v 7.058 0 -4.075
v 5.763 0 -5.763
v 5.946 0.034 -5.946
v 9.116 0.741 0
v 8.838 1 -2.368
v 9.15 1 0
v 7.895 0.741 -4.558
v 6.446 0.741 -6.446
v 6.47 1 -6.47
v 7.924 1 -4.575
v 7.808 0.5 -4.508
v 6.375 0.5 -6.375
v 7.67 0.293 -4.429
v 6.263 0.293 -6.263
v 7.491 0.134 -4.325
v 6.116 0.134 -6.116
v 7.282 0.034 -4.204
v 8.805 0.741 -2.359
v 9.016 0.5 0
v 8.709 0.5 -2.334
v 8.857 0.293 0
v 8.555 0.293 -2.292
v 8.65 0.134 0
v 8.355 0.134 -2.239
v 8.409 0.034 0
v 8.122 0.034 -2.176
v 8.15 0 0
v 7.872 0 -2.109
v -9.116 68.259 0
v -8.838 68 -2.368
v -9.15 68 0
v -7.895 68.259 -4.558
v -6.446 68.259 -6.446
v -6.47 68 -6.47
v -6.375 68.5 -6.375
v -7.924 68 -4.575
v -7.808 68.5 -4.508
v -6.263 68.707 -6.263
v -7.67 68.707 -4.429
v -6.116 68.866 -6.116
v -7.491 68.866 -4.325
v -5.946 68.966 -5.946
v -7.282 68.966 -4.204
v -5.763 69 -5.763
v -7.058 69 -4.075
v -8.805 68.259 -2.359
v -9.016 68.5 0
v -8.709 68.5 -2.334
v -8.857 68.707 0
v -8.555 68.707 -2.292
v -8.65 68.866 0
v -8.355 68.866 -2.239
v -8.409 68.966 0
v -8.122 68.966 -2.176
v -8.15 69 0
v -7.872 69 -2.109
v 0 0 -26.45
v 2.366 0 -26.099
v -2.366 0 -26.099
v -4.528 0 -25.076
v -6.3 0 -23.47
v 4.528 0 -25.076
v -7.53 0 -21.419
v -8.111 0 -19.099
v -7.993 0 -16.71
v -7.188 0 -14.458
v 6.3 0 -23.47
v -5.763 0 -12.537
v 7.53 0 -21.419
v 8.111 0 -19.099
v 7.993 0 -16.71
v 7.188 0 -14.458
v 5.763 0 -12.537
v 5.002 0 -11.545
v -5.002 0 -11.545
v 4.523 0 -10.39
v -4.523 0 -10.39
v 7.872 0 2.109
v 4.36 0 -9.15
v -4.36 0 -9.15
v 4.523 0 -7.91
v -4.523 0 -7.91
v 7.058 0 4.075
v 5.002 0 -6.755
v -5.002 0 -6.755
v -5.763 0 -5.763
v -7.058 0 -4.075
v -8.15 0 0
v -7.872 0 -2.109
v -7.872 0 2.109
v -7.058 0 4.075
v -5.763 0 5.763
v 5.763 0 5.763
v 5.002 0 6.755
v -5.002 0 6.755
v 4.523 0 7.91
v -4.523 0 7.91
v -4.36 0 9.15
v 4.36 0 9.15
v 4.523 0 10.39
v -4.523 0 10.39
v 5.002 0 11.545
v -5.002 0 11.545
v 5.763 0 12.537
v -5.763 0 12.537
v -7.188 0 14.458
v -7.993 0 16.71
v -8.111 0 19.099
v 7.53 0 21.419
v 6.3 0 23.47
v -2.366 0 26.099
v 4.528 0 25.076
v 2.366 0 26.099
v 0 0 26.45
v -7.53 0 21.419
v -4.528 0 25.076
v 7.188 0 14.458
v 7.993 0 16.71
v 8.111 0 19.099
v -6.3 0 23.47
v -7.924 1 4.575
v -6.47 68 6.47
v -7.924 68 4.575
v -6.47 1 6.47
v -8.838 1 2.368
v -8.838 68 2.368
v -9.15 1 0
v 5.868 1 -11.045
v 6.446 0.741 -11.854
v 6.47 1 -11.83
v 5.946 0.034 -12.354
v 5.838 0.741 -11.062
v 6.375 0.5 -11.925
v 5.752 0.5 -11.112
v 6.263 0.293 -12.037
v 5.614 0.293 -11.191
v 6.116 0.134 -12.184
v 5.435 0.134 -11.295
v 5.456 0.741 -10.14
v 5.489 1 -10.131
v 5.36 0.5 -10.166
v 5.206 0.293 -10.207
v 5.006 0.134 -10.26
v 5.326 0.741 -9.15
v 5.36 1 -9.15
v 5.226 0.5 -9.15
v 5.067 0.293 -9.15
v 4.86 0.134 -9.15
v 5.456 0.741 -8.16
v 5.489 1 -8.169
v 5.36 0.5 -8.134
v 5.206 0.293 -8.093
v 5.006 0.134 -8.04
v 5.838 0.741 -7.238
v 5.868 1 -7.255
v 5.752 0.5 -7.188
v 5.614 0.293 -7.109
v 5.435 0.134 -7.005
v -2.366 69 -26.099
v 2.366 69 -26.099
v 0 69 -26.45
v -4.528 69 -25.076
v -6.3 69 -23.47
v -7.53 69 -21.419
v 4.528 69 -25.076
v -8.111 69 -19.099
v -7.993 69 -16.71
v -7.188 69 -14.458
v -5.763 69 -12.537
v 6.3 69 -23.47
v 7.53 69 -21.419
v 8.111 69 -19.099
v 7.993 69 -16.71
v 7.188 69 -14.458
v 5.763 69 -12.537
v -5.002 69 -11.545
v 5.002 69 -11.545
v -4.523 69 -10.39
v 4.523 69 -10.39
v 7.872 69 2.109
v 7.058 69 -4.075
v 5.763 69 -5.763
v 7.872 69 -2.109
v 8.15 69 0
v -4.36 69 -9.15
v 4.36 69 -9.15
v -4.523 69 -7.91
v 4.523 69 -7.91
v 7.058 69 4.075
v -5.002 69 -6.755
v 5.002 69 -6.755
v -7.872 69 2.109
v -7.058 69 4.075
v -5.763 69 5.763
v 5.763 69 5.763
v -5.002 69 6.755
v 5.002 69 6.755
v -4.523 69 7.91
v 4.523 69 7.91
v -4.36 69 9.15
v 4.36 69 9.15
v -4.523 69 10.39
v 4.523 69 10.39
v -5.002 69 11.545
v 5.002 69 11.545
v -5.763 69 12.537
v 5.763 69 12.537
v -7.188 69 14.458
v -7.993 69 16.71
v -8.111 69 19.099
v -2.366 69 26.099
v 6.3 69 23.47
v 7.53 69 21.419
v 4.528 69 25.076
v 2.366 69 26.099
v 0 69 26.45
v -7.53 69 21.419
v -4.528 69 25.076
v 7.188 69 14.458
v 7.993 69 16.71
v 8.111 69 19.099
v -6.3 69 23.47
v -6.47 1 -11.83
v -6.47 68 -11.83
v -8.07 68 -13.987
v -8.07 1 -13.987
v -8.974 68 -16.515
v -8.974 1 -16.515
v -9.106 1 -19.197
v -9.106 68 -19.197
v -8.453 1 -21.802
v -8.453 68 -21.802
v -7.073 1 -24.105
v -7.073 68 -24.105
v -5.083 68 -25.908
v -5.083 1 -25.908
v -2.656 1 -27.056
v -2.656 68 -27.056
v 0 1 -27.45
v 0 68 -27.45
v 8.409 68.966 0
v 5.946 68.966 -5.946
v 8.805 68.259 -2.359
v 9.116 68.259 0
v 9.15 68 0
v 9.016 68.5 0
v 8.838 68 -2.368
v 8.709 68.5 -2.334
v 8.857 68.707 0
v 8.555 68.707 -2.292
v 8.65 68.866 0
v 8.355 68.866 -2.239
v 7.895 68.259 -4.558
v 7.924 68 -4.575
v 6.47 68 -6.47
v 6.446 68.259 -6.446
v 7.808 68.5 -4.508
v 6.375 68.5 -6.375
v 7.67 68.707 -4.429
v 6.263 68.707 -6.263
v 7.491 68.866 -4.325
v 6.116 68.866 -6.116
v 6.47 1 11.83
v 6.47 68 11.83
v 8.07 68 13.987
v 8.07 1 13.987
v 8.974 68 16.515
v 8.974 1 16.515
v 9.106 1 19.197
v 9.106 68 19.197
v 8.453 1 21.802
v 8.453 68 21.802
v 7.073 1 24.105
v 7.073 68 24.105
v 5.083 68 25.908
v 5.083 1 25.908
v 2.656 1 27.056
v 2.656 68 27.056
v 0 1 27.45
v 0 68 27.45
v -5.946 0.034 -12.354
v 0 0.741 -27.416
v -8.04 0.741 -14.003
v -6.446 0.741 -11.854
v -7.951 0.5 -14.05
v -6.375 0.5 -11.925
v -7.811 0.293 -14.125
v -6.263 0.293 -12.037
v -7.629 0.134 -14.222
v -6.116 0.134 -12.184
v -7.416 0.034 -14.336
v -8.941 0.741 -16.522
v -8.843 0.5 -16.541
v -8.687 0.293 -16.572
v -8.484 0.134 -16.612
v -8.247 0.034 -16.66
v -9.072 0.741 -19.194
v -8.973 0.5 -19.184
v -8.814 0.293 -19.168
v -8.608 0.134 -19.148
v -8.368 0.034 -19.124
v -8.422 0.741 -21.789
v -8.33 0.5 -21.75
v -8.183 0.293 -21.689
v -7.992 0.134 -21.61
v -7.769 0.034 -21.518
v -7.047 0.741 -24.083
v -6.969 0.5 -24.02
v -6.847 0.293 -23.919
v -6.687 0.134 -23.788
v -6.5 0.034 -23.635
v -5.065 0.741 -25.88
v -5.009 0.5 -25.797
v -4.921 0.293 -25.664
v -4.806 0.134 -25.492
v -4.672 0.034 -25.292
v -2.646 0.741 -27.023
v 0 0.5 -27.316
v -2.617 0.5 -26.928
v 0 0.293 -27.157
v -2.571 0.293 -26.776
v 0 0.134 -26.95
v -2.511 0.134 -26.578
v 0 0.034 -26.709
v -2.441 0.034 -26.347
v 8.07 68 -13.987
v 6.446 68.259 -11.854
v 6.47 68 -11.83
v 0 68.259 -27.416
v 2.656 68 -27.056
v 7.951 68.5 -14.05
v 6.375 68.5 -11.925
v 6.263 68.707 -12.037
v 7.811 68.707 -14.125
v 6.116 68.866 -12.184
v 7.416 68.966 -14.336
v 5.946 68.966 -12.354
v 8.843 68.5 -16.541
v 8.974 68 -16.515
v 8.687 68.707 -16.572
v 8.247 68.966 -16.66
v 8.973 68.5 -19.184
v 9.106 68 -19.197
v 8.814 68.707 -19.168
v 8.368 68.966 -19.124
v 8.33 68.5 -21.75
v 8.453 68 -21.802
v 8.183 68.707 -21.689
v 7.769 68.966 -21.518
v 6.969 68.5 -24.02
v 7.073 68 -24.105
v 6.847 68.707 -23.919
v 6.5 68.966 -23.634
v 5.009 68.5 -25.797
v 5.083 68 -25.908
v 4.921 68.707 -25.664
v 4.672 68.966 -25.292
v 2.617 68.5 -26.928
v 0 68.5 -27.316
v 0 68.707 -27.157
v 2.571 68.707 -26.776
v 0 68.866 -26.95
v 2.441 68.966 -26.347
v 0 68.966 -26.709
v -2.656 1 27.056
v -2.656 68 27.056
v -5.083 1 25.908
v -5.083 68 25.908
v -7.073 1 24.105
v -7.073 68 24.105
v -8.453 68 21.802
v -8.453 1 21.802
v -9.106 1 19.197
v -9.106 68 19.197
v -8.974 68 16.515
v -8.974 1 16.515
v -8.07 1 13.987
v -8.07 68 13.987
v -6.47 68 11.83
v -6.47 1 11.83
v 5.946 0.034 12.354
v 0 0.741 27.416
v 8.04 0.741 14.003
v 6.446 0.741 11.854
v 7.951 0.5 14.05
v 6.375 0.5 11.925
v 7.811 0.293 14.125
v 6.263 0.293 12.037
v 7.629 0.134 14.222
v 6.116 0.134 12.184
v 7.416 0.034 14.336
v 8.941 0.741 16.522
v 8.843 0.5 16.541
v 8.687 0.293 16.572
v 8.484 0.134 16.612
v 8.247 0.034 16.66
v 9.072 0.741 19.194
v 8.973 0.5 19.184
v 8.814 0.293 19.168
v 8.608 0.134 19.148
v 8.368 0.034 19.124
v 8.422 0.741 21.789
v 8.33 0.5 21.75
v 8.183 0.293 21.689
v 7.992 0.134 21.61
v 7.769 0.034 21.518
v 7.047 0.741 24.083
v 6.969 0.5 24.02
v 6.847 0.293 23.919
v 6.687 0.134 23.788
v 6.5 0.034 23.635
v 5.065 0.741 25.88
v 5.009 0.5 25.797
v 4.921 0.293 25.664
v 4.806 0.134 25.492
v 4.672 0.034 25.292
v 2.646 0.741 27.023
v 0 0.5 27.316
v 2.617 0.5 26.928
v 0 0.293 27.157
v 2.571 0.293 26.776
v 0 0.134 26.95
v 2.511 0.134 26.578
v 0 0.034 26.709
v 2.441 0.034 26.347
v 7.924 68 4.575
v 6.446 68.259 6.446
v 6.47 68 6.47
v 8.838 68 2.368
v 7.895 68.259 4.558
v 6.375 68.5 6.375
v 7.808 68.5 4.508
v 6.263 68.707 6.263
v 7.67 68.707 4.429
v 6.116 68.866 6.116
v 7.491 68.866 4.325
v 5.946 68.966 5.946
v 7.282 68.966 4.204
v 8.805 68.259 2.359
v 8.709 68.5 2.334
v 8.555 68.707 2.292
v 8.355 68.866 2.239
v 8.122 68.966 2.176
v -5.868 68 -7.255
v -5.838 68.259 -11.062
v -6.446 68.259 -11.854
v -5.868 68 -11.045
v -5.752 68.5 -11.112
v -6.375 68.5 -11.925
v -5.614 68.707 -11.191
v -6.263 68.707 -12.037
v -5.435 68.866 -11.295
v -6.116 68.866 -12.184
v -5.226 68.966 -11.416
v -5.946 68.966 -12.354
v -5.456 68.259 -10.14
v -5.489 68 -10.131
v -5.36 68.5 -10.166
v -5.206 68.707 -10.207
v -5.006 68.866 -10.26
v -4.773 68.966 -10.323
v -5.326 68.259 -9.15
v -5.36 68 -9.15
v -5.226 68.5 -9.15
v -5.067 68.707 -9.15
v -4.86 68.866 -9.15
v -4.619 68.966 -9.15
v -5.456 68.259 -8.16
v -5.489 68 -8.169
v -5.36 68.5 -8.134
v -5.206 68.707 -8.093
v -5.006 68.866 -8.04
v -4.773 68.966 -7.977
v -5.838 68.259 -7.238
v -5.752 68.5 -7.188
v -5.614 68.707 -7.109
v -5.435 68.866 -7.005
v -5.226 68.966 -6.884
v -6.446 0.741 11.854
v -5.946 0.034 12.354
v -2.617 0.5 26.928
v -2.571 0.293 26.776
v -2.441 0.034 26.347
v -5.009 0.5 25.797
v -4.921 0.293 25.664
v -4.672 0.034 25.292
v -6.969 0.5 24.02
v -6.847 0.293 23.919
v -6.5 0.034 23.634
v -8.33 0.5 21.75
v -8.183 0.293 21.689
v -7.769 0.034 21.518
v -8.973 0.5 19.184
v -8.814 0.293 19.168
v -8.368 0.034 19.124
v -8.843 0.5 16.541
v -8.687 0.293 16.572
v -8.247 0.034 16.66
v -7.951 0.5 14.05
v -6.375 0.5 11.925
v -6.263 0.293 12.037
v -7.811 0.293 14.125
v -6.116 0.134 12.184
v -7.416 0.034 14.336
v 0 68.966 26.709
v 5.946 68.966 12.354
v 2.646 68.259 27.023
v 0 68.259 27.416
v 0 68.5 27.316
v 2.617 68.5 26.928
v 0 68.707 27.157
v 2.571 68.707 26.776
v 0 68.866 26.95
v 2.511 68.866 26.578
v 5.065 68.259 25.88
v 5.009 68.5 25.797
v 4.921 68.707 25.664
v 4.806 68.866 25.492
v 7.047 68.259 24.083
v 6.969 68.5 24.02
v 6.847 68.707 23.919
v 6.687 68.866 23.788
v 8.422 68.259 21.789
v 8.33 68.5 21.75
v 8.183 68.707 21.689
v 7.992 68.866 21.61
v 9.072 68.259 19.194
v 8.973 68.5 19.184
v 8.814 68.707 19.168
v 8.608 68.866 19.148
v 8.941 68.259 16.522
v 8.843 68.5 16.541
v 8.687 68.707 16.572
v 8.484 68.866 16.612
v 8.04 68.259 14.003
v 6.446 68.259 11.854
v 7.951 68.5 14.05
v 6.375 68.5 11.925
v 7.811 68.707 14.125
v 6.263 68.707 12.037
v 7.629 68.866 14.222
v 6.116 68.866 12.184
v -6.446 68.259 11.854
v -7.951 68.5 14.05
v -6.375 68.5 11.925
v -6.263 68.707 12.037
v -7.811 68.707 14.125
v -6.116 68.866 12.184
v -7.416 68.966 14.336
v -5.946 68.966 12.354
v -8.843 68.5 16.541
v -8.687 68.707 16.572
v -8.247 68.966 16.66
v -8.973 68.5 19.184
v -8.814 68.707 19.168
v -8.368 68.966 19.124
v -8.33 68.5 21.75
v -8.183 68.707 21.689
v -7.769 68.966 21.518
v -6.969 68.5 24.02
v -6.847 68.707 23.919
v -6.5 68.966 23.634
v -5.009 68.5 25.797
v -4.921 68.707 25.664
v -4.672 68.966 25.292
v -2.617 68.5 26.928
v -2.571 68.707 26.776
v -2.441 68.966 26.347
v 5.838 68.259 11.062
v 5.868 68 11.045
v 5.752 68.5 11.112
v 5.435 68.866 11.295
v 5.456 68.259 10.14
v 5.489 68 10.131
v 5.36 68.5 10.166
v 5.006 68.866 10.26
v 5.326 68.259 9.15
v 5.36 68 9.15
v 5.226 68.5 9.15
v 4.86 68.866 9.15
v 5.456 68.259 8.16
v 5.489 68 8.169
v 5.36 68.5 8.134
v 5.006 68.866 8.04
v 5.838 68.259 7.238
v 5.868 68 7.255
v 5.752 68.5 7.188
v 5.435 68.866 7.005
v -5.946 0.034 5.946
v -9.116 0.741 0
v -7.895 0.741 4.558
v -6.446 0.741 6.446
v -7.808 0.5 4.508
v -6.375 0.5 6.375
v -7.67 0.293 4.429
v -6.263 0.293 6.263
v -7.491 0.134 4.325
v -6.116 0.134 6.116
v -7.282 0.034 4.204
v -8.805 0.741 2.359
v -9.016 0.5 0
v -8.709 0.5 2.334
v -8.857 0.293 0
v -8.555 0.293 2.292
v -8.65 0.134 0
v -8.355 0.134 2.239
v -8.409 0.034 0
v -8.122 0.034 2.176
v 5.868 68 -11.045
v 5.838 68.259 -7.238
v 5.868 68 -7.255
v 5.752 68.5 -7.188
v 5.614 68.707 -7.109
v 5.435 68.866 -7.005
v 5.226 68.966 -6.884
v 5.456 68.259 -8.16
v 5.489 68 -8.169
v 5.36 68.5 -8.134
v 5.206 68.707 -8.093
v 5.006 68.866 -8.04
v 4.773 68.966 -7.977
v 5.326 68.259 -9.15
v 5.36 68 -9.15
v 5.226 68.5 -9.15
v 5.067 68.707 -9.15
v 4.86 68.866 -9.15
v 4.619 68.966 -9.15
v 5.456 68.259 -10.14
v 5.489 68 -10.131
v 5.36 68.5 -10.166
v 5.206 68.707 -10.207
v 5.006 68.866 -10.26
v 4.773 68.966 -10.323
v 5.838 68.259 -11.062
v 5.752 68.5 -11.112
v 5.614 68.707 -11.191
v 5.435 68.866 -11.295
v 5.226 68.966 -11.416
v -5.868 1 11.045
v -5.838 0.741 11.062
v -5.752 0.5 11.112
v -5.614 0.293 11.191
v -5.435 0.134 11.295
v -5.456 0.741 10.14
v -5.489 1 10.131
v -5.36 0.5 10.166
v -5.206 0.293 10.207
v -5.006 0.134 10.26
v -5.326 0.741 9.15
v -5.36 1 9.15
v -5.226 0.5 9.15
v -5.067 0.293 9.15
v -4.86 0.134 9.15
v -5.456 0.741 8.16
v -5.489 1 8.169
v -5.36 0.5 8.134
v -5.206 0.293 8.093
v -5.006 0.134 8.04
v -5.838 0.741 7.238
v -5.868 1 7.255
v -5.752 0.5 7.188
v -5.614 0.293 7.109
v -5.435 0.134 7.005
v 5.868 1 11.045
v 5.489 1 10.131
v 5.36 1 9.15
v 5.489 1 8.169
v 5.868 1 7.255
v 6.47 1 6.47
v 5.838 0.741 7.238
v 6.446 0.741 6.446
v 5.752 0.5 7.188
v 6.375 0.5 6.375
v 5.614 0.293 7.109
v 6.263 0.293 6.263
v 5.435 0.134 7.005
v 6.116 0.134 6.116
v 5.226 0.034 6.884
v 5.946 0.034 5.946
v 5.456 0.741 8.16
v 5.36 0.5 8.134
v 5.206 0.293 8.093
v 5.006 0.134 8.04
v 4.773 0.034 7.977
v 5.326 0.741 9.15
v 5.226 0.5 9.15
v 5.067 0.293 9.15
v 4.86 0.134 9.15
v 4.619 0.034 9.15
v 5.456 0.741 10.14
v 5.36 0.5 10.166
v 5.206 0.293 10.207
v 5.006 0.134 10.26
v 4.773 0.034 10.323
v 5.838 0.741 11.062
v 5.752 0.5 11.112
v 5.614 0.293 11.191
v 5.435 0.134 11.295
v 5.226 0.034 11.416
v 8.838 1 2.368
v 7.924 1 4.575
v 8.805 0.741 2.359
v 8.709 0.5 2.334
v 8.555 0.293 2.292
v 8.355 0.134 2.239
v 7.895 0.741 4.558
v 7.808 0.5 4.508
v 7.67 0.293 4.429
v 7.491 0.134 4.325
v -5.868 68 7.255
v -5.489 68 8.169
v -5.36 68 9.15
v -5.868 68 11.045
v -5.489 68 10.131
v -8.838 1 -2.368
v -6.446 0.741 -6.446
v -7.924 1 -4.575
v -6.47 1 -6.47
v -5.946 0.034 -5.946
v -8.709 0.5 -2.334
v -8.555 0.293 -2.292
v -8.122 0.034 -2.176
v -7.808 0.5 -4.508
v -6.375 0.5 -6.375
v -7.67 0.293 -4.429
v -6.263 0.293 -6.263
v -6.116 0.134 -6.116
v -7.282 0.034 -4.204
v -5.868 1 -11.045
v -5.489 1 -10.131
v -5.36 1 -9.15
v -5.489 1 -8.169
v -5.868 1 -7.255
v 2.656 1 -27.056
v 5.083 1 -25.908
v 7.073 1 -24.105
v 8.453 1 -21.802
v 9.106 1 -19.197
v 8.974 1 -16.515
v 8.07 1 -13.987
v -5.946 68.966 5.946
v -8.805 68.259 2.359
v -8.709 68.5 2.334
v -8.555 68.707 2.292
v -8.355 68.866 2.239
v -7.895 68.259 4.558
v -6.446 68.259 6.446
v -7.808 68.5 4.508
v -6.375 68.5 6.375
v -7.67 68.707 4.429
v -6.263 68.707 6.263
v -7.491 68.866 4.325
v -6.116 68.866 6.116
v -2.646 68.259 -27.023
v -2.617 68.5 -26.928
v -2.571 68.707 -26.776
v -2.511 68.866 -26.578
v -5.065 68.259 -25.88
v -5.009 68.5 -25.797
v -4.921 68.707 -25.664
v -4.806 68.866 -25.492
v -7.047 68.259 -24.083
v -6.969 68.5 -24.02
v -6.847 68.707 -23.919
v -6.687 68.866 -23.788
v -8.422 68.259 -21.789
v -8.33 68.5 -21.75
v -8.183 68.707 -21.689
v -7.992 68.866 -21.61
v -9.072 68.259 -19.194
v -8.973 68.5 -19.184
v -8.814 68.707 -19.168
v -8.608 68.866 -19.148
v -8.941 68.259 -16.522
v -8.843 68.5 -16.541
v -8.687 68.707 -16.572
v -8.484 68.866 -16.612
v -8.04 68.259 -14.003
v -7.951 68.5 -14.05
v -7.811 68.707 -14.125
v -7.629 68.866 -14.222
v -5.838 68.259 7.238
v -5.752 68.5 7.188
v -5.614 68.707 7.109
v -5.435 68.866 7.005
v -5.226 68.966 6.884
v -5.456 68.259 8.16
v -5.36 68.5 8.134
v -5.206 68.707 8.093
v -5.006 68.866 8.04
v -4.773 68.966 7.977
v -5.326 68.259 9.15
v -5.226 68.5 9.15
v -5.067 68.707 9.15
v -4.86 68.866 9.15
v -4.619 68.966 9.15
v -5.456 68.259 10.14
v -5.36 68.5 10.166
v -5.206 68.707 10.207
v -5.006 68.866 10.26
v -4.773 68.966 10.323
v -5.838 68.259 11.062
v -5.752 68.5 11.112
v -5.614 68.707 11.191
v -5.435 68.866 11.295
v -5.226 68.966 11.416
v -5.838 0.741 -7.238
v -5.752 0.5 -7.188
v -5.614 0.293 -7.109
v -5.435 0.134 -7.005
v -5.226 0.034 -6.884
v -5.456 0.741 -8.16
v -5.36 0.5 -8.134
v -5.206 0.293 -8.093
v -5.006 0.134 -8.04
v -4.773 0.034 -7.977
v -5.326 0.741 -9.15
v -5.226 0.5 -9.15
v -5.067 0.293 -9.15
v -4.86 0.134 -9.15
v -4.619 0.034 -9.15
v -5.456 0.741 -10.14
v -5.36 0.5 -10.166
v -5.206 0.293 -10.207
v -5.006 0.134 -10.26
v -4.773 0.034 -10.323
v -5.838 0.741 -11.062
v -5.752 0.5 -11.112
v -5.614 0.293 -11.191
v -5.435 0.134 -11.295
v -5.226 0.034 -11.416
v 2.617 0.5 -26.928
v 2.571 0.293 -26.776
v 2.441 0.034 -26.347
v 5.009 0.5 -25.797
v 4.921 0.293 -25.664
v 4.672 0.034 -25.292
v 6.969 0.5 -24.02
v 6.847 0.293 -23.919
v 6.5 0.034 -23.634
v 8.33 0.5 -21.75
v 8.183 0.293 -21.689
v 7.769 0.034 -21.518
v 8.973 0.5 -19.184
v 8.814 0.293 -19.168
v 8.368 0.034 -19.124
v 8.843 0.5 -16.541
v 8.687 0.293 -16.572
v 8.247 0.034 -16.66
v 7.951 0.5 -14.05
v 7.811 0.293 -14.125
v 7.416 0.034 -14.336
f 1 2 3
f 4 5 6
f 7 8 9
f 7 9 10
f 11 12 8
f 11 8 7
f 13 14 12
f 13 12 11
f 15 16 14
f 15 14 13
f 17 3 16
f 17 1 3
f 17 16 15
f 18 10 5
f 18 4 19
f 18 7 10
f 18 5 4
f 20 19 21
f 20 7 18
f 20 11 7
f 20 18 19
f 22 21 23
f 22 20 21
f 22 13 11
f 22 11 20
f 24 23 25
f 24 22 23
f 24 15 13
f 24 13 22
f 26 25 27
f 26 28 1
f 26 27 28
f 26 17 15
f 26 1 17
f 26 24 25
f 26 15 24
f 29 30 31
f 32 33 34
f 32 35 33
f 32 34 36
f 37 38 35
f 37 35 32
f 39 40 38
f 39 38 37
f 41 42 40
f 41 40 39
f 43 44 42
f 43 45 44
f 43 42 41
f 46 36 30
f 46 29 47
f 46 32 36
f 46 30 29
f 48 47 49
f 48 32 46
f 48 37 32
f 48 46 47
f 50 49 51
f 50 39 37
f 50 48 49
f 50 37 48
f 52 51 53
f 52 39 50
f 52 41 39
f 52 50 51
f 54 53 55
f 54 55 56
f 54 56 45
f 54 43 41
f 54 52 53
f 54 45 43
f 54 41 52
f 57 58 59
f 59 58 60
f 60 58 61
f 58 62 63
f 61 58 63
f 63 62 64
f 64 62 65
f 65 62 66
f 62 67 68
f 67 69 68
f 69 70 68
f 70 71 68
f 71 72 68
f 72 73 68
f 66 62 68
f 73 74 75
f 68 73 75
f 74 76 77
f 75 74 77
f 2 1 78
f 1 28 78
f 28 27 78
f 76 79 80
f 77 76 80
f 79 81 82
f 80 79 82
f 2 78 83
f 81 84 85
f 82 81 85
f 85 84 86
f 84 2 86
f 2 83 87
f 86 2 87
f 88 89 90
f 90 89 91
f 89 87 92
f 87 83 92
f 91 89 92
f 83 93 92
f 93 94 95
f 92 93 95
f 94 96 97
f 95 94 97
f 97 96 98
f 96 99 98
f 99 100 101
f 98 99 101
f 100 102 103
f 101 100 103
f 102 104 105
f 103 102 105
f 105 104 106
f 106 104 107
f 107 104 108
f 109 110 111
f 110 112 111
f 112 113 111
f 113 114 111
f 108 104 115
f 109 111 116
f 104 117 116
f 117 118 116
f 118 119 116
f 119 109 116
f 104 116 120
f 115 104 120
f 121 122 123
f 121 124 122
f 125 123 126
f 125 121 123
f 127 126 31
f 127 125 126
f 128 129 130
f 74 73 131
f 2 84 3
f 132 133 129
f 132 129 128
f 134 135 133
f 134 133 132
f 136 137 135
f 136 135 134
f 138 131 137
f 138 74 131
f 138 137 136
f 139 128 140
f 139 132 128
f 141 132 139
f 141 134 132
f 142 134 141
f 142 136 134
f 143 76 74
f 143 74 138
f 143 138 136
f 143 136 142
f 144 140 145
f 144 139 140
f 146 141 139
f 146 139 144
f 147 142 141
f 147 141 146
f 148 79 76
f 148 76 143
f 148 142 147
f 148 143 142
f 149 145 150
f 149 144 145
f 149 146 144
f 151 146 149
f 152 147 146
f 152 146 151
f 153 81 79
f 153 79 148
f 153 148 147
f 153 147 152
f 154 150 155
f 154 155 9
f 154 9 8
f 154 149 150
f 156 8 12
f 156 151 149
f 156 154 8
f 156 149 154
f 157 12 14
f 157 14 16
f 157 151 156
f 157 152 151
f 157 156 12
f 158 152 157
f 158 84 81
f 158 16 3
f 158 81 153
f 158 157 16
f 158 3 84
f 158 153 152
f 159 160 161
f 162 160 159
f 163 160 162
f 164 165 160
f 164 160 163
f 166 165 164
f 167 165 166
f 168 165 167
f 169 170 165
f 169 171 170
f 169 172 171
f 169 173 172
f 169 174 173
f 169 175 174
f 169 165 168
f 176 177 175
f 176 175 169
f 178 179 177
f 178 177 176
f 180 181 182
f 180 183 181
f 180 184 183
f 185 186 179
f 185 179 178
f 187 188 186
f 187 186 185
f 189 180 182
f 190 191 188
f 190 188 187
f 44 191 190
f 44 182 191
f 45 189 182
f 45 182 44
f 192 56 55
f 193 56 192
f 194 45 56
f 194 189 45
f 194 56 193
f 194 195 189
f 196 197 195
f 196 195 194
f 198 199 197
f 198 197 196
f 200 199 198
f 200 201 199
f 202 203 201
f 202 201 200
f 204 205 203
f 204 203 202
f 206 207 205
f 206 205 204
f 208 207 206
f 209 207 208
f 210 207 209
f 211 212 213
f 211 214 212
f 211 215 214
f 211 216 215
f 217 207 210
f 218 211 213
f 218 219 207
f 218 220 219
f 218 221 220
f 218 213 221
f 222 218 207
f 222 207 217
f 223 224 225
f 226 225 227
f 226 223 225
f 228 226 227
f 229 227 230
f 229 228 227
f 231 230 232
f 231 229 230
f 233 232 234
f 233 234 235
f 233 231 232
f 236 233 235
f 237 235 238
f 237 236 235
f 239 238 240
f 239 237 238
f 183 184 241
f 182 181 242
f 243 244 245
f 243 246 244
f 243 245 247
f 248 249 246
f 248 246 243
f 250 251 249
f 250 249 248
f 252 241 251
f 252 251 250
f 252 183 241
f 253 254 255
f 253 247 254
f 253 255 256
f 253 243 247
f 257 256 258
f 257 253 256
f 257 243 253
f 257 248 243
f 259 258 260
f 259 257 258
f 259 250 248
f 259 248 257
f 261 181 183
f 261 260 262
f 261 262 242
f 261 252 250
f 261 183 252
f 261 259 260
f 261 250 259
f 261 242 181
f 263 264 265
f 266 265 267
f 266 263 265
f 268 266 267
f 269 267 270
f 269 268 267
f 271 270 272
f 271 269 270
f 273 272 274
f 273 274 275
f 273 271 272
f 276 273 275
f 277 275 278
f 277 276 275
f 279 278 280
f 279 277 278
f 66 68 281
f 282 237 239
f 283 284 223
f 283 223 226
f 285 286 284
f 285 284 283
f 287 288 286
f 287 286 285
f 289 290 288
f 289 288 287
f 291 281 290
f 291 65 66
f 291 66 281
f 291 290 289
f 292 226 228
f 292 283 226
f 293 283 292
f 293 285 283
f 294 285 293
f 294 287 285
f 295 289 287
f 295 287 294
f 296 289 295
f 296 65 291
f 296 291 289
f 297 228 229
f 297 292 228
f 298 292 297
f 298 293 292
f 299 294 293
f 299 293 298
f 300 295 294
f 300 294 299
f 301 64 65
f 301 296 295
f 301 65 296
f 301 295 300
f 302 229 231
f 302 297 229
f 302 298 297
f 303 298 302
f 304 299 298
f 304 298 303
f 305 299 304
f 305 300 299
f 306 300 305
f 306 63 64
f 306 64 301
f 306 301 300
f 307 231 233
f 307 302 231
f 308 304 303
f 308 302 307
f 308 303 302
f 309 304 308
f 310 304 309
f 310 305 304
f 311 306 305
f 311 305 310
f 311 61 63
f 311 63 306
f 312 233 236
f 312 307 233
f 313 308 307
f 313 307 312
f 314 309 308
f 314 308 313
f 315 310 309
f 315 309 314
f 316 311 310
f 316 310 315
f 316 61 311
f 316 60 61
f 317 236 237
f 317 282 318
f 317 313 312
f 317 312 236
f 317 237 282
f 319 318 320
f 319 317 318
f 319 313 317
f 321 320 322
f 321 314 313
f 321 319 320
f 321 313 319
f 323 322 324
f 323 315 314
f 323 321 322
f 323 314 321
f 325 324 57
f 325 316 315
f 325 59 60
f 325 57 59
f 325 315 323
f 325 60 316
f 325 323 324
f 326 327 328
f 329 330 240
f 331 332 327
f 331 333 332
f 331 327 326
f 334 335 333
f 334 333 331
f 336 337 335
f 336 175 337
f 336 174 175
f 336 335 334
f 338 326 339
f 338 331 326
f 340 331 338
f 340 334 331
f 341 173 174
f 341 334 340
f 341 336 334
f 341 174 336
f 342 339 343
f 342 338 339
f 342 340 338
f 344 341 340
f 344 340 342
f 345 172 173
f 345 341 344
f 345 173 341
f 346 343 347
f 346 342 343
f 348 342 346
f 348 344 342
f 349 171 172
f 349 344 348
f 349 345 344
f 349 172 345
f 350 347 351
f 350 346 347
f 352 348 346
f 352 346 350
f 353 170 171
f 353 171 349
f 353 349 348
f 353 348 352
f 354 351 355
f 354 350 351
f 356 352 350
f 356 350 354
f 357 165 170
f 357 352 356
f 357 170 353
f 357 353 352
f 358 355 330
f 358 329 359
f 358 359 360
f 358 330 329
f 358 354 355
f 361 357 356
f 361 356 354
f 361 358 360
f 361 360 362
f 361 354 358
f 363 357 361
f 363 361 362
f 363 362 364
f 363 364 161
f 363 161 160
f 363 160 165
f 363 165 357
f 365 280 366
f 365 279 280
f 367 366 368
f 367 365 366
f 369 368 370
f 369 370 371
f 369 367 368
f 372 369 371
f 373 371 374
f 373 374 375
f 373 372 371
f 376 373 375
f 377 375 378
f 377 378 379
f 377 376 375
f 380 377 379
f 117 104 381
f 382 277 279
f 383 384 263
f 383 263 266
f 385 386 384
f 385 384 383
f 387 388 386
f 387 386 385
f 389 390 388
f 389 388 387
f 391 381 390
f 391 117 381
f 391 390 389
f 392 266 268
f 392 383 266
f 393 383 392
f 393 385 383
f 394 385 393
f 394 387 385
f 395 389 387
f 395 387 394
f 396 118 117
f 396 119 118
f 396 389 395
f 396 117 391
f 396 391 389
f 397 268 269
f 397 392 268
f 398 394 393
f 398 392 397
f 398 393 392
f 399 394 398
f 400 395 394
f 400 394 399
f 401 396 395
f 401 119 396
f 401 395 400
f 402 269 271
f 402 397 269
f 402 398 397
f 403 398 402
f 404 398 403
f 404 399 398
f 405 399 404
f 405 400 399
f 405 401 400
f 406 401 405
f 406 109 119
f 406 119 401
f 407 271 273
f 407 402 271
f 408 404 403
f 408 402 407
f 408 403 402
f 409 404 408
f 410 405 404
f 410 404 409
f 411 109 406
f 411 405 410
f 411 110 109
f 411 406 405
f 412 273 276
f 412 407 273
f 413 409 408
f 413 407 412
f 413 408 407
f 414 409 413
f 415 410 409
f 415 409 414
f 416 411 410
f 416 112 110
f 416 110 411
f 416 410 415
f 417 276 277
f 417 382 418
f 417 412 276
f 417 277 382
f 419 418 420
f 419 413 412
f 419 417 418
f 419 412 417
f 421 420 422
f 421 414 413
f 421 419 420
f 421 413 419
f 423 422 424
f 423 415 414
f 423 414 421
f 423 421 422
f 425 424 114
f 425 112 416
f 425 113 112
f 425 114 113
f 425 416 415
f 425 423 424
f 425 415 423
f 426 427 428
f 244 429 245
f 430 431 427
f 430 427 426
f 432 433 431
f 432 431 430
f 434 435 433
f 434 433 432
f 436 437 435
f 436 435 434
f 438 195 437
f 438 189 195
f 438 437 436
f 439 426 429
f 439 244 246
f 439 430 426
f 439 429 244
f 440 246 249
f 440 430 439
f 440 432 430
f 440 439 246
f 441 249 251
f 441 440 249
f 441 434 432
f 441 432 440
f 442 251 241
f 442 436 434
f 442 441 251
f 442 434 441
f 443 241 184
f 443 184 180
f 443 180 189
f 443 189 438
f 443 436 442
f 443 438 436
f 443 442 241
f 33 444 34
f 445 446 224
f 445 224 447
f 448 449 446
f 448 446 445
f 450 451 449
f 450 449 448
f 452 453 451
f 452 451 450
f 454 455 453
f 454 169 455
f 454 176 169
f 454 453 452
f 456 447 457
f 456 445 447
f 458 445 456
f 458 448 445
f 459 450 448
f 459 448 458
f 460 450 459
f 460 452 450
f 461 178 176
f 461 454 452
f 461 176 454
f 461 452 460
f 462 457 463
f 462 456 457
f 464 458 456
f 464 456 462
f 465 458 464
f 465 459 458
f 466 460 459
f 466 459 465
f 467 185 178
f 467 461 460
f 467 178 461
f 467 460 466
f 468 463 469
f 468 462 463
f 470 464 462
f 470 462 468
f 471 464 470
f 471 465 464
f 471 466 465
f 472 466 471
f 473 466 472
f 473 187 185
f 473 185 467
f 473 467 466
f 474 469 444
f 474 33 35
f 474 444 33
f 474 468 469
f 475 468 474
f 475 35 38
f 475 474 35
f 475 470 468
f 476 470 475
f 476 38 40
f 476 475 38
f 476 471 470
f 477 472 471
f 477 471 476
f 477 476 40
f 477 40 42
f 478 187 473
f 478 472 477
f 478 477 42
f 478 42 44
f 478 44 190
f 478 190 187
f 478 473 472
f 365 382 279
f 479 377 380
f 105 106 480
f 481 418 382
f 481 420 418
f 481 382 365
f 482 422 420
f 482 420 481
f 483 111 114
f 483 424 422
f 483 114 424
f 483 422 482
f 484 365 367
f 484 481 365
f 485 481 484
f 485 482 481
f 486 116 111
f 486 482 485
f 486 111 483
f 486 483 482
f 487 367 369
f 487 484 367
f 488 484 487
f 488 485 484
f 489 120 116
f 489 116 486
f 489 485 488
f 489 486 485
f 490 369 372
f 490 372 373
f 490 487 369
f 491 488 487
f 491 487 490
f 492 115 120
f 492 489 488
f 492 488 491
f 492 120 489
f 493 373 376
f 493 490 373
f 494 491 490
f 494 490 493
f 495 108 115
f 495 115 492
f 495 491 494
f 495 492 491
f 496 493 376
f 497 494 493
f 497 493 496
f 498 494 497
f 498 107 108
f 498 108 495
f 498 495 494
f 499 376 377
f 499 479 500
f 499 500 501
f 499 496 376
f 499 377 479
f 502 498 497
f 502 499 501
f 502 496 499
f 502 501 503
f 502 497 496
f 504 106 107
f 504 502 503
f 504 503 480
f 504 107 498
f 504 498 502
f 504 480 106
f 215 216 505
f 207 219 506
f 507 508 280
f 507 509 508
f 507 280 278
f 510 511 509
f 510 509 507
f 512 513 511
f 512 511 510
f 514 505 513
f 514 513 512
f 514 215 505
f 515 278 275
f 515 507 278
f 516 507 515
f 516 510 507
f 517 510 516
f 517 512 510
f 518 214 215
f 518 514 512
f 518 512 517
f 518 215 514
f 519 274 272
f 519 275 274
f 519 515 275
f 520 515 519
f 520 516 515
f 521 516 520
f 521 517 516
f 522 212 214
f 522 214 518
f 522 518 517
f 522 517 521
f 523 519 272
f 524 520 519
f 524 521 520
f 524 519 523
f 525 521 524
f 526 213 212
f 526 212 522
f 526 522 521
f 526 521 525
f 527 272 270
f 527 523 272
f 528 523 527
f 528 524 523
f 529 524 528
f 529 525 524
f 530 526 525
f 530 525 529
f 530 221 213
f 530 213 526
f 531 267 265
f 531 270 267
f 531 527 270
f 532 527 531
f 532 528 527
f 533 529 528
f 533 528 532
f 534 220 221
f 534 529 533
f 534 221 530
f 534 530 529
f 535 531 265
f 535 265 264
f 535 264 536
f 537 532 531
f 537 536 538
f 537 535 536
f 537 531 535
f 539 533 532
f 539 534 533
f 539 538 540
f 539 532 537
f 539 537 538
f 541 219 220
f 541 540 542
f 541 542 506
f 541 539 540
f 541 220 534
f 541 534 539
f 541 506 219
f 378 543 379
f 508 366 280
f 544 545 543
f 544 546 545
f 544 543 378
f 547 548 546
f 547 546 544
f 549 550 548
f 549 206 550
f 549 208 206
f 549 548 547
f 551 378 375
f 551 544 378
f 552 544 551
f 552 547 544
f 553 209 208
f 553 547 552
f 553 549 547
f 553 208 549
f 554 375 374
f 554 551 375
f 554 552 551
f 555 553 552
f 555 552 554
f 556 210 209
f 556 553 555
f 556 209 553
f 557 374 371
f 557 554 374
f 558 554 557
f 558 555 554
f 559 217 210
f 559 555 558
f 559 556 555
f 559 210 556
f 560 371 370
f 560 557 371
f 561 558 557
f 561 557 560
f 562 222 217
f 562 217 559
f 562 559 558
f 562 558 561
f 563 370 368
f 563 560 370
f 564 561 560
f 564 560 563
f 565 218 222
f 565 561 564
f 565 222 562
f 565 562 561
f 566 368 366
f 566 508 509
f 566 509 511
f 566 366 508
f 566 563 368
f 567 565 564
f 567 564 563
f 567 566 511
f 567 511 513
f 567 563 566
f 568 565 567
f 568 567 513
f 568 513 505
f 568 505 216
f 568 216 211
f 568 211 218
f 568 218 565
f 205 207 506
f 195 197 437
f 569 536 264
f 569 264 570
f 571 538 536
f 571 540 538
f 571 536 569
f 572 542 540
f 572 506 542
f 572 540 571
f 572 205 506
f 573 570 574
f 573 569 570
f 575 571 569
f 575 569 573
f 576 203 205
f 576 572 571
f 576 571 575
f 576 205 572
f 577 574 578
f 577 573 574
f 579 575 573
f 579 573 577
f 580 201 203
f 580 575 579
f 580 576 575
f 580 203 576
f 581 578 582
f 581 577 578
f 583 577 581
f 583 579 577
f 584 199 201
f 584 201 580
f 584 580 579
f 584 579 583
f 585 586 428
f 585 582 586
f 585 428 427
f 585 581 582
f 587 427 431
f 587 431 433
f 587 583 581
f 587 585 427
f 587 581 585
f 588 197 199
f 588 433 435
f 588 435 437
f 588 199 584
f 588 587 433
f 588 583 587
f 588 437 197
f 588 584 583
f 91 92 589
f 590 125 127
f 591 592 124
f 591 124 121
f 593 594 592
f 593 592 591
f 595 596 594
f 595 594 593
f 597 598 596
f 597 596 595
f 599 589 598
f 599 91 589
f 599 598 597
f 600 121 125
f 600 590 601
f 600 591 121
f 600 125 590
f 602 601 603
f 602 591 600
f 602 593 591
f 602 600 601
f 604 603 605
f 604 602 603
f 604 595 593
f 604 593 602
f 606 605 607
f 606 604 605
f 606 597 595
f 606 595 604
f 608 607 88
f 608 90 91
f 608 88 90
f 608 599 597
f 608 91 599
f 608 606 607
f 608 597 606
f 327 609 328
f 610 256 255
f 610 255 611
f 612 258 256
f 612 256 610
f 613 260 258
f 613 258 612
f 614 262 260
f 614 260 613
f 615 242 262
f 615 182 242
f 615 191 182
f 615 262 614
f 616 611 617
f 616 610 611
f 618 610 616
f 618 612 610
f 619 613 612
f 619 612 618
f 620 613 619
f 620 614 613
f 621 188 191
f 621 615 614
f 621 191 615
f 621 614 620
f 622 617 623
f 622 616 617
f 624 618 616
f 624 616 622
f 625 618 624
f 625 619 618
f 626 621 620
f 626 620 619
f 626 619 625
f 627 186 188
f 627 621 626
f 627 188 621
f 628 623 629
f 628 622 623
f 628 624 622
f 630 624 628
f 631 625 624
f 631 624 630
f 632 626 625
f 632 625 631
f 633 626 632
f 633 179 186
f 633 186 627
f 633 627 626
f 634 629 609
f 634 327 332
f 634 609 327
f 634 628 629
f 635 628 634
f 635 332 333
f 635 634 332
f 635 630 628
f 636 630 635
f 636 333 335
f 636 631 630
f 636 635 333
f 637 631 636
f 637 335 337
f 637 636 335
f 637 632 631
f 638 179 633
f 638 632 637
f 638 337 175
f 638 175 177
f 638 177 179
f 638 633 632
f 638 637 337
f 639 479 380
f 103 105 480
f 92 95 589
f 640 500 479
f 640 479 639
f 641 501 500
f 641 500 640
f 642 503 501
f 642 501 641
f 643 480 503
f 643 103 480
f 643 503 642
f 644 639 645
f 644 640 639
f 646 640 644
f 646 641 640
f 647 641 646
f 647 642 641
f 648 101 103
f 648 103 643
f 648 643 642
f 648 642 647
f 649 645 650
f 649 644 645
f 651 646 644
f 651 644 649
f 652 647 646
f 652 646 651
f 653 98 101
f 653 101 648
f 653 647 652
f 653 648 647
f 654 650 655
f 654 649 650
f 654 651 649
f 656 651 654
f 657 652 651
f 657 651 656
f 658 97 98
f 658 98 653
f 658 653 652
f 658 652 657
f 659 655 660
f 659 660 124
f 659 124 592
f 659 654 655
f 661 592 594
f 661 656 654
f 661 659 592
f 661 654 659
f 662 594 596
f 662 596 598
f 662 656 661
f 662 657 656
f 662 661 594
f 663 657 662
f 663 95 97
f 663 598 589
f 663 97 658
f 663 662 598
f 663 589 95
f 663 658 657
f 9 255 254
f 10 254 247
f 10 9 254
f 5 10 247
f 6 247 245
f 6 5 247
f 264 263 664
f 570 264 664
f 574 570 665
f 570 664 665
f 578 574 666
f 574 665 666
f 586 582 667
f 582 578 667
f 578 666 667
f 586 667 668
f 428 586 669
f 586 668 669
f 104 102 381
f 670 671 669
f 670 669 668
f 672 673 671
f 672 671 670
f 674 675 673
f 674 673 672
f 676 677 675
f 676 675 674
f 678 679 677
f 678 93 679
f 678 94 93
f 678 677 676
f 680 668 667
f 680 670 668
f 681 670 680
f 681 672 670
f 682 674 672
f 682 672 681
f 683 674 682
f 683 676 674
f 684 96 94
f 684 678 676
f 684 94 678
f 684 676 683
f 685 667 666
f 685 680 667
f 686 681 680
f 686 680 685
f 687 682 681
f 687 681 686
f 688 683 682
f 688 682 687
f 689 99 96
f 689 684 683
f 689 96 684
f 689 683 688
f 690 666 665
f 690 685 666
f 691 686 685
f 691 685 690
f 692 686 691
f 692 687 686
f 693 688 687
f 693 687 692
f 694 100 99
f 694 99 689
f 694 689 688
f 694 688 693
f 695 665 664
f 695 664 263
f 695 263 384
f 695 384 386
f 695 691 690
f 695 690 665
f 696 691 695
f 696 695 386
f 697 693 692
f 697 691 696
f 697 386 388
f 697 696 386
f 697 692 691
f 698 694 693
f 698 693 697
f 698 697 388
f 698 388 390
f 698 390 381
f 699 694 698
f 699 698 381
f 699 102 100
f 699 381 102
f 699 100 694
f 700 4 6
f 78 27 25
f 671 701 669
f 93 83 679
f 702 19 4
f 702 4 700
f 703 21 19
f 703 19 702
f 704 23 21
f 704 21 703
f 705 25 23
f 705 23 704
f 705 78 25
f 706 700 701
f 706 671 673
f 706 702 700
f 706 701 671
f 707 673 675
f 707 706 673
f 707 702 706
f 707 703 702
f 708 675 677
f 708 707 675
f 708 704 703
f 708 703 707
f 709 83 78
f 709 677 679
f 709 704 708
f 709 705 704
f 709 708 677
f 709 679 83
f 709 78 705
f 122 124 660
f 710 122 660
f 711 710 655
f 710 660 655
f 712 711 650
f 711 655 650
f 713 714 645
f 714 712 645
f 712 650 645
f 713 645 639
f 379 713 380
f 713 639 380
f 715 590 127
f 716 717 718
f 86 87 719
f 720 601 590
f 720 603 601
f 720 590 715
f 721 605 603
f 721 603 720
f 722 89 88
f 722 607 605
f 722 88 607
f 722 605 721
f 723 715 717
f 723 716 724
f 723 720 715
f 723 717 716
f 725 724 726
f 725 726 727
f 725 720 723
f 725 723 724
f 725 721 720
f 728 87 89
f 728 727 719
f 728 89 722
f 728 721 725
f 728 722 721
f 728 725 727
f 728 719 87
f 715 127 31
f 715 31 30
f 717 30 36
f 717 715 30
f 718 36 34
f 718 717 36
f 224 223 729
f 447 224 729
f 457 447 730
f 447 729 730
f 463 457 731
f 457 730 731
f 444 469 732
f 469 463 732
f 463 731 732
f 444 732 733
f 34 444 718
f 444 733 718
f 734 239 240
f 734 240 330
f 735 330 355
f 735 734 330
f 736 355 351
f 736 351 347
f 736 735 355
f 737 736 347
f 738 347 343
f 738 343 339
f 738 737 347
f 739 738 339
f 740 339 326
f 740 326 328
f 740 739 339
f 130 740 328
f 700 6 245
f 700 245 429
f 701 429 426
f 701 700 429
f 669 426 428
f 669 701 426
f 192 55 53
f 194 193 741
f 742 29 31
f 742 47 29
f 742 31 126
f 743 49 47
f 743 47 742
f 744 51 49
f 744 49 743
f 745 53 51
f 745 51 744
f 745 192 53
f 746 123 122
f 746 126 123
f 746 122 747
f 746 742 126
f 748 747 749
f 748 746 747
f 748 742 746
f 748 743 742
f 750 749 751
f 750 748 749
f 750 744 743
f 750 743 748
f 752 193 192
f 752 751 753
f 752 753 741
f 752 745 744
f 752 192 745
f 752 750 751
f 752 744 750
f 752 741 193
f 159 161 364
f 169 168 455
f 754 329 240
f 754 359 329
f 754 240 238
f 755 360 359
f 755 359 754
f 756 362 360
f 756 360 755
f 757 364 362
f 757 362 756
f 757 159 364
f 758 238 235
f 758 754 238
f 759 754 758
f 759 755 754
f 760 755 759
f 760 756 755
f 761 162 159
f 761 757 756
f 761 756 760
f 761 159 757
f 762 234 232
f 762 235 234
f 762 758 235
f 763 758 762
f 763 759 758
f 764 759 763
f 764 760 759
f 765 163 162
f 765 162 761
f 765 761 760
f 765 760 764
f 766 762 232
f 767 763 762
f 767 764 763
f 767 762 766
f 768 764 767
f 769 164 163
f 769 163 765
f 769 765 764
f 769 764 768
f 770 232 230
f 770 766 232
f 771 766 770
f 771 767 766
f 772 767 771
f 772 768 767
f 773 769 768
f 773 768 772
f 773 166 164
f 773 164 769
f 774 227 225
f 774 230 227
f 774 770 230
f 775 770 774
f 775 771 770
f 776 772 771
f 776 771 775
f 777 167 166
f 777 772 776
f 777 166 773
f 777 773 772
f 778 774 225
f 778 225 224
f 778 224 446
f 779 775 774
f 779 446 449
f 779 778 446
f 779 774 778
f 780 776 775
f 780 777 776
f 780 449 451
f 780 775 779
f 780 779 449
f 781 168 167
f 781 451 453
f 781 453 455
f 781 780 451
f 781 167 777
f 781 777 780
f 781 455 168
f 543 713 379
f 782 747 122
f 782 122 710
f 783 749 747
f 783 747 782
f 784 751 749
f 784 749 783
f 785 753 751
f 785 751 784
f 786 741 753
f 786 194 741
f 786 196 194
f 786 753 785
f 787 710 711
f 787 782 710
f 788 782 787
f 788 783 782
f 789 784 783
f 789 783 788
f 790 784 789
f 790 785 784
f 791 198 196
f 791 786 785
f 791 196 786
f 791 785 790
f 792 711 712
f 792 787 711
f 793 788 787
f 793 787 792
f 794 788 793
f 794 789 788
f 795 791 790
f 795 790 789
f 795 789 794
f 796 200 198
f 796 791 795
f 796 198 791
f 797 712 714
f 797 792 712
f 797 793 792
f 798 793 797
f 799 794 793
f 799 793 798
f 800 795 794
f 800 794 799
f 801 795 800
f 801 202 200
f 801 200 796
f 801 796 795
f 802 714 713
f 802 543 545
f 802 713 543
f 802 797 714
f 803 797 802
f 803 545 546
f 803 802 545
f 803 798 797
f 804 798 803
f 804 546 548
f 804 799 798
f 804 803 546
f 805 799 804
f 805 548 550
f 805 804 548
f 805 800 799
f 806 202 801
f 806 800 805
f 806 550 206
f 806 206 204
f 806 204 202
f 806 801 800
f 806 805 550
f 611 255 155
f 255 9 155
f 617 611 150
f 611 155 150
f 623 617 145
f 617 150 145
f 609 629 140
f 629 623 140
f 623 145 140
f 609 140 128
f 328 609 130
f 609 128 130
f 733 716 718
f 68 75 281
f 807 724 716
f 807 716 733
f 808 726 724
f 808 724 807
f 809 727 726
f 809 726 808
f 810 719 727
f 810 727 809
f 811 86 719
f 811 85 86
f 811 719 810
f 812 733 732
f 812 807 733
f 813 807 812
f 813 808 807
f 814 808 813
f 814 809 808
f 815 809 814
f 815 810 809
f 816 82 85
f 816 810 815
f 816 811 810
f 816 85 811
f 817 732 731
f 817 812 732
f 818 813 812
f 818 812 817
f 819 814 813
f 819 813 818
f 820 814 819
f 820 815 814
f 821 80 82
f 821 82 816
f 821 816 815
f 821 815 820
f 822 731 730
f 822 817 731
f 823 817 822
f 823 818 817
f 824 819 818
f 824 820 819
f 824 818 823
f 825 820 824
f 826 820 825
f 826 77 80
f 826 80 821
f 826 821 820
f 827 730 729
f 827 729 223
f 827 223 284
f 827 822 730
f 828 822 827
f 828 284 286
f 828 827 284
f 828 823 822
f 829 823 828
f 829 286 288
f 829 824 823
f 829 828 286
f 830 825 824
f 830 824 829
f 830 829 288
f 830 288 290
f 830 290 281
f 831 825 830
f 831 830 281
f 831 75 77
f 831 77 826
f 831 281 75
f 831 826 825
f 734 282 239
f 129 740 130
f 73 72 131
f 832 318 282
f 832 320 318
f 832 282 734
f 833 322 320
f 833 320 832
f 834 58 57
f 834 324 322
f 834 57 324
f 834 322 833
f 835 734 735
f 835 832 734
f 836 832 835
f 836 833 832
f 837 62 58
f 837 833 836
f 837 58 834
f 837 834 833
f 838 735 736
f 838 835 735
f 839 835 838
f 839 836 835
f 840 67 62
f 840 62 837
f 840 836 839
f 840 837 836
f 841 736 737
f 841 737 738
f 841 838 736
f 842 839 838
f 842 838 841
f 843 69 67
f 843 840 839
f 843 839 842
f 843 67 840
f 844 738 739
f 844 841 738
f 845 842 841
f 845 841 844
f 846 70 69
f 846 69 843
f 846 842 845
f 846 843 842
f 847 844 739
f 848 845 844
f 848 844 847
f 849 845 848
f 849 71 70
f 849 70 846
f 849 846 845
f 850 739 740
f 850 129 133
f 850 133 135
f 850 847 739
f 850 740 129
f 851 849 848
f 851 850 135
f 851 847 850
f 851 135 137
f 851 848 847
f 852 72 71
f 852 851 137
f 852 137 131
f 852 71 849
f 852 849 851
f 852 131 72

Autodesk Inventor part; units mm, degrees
ref_plane "YZ Plane" through (0, 0, 0) normal (1, 0, 0) x (0, 1, 0)
ref_plane "XZ Plane" through (0, 0, 0) normal (0, 1, 0) x (-1, 0, 0)
ref_plane "XY Plane" through (0, 0, 0) normal (0, 0, 1) x (1, 0, 0)
sketch "Skizze1" plane through (0, 0, 0) normal (0, 1, 0) x (-1, 0, 0)
  arc A0 (6.47, 11.83) -> (0, 27.45) centre (0, 18.3) ccw
  line L0 (9.15, 18.3) -> (9.15, 0) construction
  arc A1 (6.47, 11.83) -> (6.47, 6.47) centre (9.15, 9.15) ccw
  arc A2 (9.15, 0) -> (6.47, 6.47) centre (0, 0) ccw
  line L1 (0, 18.3) -> (0, 0) construction
  line L2 (0, 18.3) -> (0, 27.45) construction
  arc A3 (0, 27.45) -> (-6.47, 11.83) centre (0, 18.3) ccw
  arc A4 (-6.47, 6.47) -> (-6.47, 11.83) centre (-9.15, 9.15) ccw
  arc A5 (-6.47, 6.47) -> (-9.15, 0) centre (0, 0) ccw
  line L3 (9.15, 0) -> (-9.15, 0) construction
  line L4 (14.3464, 0) -> (-13.2665, 0) construction
  arc A6 (0, -27.45) -> (6.47, -11.83) centre (0, -18.3) ccw
  arc A7 (6.47, -6.47) -> (6.47, -11.83) centre (9.15, -9.15) ccw
  arc A8 (6.47, -6.47) -> (9.15, 0) centre (0, 0) ccw
  arc A9 (-6.47, -11.83) -> (-6.47, -6.47) centre (-9.15, -9.15) ccw
  arc A10 (-9.15, 0) -> (-6.47, -6.47) centre (0, 0) ccw
  arc A11 (-6.47, -11.83) -> (0, -27.45) centre (0, -18.3) ccw
  dimension "d1" = 18.3
  dimension "d3" = 9.15
  dimension "d5" = 9.15
  dimension "d6" = 9.15
  dimension "d7" = 9.15
  dimension "d8" = 3.79
extrude "Extrusion1" add sketch "Skizze1" along normal blind 69
fillet "Rundung1" radius 1 16 edges at (5.3599, 69, 9.15) (8.4535, 69, -3.5016) (5.3599, 69, -9.15) (-8.4535, 69, -21.8016) (-5.3599, 69, -9.15) (-8.4535, 69, 3.5016) (-5.3599, 69, 9.15) (8.4535, 69, 21.8016) (5.3599, 0, 9.15) (8.4535, 0, 3.5016) (5.3599, 0, -9.15) (-8.4535, 0, -21.8016) (-5.3599, 0, -9.15) (-8.4535, 0, 3.5016) (-5.3599, 0, 9.15) (-8.4535, 0, 21.8016)
properties part number "BatteryPack6600mAh"
